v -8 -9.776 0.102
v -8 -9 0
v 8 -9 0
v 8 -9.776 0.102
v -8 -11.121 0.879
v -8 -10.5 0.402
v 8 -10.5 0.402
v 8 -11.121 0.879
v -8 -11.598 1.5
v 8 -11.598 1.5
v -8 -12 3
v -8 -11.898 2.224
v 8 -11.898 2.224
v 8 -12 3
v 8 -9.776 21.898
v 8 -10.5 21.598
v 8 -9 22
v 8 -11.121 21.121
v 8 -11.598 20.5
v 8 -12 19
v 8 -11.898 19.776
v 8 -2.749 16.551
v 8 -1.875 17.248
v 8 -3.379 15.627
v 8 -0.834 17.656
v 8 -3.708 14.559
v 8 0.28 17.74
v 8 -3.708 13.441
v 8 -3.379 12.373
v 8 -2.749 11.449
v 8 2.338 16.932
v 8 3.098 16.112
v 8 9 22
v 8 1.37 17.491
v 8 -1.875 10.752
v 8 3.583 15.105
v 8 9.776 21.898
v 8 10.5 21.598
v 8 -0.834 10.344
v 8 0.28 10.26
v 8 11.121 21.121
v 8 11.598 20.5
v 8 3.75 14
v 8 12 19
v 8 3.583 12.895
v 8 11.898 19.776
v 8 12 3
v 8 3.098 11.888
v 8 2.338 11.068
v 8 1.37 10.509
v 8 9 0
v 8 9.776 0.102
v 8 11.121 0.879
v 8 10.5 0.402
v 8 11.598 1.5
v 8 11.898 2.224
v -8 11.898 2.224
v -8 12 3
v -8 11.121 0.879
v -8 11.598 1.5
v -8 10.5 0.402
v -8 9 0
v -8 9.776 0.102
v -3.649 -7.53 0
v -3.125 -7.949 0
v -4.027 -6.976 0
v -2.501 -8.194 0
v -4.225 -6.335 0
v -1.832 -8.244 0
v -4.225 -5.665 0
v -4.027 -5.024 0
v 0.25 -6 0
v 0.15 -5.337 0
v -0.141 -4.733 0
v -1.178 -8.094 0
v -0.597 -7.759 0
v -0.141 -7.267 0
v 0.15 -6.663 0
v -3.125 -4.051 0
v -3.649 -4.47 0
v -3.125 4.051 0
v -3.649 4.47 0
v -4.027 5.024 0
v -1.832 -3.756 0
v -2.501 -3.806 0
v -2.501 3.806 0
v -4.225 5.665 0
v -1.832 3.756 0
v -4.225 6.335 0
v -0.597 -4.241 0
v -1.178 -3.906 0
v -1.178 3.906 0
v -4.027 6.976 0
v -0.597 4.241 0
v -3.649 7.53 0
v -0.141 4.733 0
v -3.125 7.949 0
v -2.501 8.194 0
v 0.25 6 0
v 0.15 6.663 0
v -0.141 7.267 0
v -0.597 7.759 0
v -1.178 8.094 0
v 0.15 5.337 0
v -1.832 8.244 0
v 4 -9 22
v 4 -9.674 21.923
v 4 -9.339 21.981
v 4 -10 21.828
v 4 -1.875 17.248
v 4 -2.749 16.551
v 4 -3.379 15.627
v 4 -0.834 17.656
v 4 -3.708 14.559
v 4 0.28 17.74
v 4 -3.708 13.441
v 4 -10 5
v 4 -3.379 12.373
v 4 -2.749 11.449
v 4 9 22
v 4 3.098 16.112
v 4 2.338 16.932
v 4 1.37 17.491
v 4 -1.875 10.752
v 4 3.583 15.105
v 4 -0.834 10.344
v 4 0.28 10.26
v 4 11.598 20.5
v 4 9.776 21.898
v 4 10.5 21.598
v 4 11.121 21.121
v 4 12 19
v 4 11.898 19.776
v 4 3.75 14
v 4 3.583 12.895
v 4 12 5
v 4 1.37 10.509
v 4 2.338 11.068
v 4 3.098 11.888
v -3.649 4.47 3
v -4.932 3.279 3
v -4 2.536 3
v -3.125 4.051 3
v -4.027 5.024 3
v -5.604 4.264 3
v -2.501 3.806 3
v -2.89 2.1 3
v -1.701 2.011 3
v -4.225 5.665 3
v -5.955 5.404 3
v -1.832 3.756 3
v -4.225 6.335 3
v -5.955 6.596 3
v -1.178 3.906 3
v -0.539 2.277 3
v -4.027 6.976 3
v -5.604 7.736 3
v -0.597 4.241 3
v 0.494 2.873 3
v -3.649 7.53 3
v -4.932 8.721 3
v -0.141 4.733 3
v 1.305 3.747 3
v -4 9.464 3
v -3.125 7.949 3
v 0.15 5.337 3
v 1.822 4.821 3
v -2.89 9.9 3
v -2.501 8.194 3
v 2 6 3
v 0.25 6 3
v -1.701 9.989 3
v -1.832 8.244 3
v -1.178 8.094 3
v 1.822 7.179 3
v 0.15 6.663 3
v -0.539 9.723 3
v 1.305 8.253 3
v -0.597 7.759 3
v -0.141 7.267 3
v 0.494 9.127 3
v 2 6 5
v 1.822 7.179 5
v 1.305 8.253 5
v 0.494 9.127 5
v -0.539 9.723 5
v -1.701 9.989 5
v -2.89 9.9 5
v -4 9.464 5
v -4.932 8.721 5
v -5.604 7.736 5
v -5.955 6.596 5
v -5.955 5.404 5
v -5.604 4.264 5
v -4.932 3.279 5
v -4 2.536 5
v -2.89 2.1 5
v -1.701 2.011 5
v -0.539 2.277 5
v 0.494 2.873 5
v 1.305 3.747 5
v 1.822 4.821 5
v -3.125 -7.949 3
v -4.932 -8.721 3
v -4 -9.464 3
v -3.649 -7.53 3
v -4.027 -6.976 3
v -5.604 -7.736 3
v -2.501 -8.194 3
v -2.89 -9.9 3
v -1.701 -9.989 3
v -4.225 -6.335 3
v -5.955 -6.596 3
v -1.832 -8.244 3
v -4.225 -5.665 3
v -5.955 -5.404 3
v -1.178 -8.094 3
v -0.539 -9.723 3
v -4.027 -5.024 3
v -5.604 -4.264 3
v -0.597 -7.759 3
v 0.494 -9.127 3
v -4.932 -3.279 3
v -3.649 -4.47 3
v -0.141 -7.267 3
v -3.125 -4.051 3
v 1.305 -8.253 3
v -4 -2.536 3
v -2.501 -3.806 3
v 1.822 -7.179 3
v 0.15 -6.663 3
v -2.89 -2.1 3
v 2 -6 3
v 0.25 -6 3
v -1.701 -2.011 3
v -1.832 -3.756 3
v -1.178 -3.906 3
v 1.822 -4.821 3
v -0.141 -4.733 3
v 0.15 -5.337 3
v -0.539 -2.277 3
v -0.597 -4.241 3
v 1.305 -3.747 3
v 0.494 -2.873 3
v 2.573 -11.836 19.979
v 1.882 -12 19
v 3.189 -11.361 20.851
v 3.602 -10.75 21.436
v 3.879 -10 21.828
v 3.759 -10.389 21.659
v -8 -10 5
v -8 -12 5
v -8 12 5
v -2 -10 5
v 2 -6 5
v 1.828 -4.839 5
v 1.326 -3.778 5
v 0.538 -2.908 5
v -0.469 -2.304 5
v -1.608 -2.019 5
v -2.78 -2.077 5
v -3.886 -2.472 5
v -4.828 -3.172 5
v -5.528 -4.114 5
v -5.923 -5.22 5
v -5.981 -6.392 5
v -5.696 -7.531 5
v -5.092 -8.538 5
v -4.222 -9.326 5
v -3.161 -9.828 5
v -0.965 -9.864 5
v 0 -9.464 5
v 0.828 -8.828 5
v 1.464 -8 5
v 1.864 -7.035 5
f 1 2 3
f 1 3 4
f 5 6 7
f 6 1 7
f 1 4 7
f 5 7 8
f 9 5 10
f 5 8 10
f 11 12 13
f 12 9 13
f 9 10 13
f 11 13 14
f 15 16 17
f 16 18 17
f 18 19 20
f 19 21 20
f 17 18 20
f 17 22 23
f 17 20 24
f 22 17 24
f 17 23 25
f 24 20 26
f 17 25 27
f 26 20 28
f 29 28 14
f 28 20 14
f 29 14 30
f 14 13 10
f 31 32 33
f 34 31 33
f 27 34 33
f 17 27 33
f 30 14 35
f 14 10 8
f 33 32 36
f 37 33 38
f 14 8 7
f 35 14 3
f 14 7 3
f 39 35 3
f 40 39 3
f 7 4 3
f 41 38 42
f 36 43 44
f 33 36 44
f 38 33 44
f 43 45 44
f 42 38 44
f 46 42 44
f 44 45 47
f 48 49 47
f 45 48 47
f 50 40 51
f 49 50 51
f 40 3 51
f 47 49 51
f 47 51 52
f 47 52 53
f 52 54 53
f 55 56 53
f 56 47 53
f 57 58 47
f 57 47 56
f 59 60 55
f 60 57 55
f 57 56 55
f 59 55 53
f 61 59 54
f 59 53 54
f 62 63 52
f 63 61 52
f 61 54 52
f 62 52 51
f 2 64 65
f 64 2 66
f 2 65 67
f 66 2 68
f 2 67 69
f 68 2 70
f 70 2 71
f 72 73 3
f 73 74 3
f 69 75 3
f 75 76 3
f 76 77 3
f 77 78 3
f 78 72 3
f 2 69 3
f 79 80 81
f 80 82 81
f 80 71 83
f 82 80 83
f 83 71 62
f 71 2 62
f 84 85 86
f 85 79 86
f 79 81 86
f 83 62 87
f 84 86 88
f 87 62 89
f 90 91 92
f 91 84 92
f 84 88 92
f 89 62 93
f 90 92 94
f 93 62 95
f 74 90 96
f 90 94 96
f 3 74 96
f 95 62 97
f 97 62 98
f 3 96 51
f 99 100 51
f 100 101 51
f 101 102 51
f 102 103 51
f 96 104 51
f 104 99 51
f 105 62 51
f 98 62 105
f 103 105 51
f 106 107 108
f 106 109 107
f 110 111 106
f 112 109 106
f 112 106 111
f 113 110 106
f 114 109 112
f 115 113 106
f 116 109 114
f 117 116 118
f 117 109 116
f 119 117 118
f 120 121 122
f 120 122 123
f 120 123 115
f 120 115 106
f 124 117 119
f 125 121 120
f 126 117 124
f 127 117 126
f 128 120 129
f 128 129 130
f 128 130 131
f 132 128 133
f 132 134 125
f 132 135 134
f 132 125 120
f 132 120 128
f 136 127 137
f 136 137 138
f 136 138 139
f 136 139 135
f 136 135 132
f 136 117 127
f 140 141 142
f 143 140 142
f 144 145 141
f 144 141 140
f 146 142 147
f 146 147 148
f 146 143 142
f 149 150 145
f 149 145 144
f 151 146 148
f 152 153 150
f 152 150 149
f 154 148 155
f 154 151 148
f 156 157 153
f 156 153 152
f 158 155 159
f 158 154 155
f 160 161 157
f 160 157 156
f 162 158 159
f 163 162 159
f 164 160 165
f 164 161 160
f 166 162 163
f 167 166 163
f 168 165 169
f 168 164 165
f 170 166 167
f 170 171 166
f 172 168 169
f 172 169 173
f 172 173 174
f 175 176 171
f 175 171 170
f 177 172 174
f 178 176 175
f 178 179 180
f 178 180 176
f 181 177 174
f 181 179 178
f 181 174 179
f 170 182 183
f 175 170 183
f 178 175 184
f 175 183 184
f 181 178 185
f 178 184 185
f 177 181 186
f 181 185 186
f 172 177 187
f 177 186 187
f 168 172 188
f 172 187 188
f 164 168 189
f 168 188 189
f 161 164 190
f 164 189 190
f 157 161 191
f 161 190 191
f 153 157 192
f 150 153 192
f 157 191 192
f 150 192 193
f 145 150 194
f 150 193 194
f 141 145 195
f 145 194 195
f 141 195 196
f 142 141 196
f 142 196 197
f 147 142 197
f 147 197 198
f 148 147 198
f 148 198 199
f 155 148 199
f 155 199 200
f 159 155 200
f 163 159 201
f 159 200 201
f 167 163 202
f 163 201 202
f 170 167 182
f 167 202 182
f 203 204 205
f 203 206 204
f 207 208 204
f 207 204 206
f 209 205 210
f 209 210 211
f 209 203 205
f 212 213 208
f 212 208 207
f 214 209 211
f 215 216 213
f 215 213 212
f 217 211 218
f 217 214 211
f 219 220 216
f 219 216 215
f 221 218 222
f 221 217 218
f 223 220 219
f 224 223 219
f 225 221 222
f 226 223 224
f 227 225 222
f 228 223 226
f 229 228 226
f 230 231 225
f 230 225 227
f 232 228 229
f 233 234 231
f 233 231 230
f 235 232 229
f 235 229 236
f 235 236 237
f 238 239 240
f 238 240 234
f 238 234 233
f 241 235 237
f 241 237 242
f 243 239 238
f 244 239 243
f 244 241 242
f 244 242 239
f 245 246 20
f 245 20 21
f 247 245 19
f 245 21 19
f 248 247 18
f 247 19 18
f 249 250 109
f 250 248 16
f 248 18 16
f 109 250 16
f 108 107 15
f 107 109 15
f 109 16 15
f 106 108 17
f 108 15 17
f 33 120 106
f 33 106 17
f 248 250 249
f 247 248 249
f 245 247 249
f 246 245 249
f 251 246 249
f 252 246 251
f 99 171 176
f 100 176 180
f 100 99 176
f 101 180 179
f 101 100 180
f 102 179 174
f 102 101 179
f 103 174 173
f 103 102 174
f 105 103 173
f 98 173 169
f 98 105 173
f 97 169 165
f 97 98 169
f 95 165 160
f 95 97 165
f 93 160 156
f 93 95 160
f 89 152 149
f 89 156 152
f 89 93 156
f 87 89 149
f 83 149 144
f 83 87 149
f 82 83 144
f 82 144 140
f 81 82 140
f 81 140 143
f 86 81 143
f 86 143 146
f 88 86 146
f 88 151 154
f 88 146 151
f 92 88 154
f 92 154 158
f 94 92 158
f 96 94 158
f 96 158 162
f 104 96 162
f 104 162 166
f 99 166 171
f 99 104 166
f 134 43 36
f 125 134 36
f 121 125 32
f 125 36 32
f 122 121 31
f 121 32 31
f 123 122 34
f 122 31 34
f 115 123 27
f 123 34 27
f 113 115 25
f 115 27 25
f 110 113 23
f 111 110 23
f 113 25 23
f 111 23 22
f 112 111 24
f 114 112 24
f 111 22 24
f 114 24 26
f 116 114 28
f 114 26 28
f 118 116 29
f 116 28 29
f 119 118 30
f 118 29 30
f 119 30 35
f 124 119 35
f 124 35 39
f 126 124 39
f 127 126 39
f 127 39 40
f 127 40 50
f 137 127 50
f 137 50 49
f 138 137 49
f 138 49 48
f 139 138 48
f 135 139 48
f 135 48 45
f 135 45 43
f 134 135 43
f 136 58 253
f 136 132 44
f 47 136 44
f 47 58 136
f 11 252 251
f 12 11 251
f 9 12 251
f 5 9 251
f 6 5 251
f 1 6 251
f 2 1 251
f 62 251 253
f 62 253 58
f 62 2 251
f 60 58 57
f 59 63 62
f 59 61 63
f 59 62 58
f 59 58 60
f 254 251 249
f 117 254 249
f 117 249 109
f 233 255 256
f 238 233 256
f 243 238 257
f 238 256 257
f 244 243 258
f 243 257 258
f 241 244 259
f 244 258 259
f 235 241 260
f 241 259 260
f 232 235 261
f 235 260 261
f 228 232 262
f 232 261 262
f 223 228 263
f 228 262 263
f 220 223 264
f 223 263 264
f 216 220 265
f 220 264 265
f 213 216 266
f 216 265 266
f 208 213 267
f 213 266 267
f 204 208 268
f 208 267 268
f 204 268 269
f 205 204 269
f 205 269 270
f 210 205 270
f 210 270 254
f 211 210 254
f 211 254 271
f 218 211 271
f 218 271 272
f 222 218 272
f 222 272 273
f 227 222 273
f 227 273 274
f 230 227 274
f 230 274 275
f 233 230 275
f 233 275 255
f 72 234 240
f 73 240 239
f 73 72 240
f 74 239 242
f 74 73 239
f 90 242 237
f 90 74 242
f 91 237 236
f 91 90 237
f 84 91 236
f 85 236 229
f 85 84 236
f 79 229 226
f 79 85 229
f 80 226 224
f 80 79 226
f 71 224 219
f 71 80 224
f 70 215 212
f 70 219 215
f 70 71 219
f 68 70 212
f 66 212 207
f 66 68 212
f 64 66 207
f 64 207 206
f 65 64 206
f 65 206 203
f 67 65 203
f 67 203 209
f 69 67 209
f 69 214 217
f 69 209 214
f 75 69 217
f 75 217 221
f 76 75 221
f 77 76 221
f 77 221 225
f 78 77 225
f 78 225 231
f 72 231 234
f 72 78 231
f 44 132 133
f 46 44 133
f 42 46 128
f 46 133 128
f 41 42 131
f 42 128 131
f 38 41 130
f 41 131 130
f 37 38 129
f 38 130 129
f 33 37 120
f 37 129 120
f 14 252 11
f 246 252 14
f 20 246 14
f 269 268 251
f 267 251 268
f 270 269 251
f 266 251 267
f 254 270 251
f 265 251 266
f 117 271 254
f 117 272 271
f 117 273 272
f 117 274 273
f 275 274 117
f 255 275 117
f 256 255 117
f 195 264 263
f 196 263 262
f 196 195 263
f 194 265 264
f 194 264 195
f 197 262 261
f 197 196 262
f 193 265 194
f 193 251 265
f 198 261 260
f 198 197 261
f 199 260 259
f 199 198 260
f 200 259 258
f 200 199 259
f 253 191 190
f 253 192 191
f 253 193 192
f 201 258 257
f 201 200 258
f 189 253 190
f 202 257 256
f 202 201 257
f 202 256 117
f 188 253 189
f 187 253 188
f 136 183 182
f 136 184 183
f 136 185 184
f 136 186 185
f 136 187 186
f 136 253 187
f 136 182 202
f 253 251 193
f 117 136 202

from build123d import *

# Parameters (mm, degrees)
SKETCH1_W                = 16
SKETCH1_H                = 24
SKETCH1_R                = 2.25
BOSS_EXTRUDE1_DEPTH      = 5
BOSS_EXTRUDE2_DEPTH      = 17
BOSS_EXTRUDE2_DEPTH_BACK = 5
SKETCH2_W                = 4
SKETCH2_H                = 24
SKETCH3_R                = 3.75
CUT_EXTRUDE1_DEPTH       = 30.732137495
BOSS_EXTRUDE3_DEPTH      = 2
FILLET1_R                = 3
SKETCH5_R                = 4
CUT_EXTRUDE2_DEPTH       = 2


with BuildPart() as part:
    # Sketch1 → Boss-Extrude1 (new body)
    with BuildSketch(Plane.XY):
        Rectangle(SKETCH1_W, SKETCH1_H)
        with Locations((-2, 6)):
            Circle(SKETCH1_R, mode=Mode.SUBTRACT)
        with Locations((-2, -6)):
            Circle(SKETCH1_R, mode=Mode.SUBTRACT)
    extrude(amount=BOSS_EXTRUDE1_DEPTH)

    # Sketch2 → Boss-Extrude2 (add, two sides: drawn at the far end of the back side and taken through both)
    with BuildSketch(Plane.XY.offset(5).offset(-BOSS_EXTRUDE2_DEPTH_BACK)):
        with Locations((6, 0)):
            Rectangle(SKETCH2_W, SKETCH2_H)
    extrude(amount=BOSS_EXTRUDE2_DEPTH + BOSS_EXTRUDE2_DEPTH_BACK)

    # Sketch3 → Cut-Extrude1 (cut, through all)
    with BuildSketch(Plane(origin=(8, 0, 0), x_dir=(0, 0, -1), z_dir=(1, 0, 0))):
        with Locations(Location((-14, 0, 0), (0, 0, 90))):
            Circle(SKETCH3_R)
    extrude(amount=-CUT_EXTRUDE1_DEPTH, mode=Mode.SUBTRACT)

    # Sketch4 → Boss-Extrude3 (add)
    with BuildSketch(Plane.XZ.offset(12)):
        Polygon((4, 22), (-8, 5), (4, 5), align=None)
    extrude(amount=-BOSS_EXTRUDE3_DEPTH)

    # Fillet1
    # the kernel refuses this fillet: 3 mm, written as the material it takes off along each edge
    with BuildSketch(Plane(origin=(15.5, -12, 22), x_dir=(0, 1, 0), z_dir=(-1, 0, 0))) as fillet1_piece_1:
        with BuildLine():
            CenterArc((FILLET1_R, FILLET1_R), FILLET1_R, 180, 90)
            Line((0, FILLET1_R), (0, 0))
            Line((0, 0), (FILLET1_R, 0))
        make_face()
    extrude(amount=19, mode=Mode.SUBTRACT)
    with BuildSketch(Plane(origin=(-3.5, 12, 22), x_dir=(0, 0, -1), z_dir=(1, 0, 0))) as fillet1_piece_2:
        with BuildLine():
            CenterArc((FILLET1_R, -FILLET1_R), FILLET1_R, 90, 90)
            Line((0, -FILLET1_R), (0, 0))
            Line((0, 0), (FILLET1_R, 0))
        make_face()
    extrude(amount=19, mode=Mode.SUBTRACT)
    with BuildSketch(Plane(origin=(15.5, -12, 0), x_dir=(0, 1, 0), z_dir=(-1, 0, 0)), Plane(origin=(15.5, 12, 0), x_dir=(0, 0, 1), z_dir=(-1, 0, 0))) as fillet1_piece_3:
        with BuildLine():
            CenterArc((FILLET1_R, -FILLET1_R), FILLET1_R, 90, 90)
            Line((0, -FILLET1_R), (0, 0))
            Line((0, 0), (FILLET1_R, 0))
        make_face()
    extrude(amount=31, mode=Mode.SUBTRACT)

    # Sketch5 → Cut-Extrude2 (cut)
    with BuildSketch(Plane.XY.offset(5)):
        with Locations((-2, 6)):
            Circle(SKETCH5_R)
        with Locations((-2, -6)):
            Circle(SKETCH5_R)
    extrude(amount=-CUT_EXTRUDE2_DEPTH, mode=Mode.SUBTRACT)


solid = part.part
